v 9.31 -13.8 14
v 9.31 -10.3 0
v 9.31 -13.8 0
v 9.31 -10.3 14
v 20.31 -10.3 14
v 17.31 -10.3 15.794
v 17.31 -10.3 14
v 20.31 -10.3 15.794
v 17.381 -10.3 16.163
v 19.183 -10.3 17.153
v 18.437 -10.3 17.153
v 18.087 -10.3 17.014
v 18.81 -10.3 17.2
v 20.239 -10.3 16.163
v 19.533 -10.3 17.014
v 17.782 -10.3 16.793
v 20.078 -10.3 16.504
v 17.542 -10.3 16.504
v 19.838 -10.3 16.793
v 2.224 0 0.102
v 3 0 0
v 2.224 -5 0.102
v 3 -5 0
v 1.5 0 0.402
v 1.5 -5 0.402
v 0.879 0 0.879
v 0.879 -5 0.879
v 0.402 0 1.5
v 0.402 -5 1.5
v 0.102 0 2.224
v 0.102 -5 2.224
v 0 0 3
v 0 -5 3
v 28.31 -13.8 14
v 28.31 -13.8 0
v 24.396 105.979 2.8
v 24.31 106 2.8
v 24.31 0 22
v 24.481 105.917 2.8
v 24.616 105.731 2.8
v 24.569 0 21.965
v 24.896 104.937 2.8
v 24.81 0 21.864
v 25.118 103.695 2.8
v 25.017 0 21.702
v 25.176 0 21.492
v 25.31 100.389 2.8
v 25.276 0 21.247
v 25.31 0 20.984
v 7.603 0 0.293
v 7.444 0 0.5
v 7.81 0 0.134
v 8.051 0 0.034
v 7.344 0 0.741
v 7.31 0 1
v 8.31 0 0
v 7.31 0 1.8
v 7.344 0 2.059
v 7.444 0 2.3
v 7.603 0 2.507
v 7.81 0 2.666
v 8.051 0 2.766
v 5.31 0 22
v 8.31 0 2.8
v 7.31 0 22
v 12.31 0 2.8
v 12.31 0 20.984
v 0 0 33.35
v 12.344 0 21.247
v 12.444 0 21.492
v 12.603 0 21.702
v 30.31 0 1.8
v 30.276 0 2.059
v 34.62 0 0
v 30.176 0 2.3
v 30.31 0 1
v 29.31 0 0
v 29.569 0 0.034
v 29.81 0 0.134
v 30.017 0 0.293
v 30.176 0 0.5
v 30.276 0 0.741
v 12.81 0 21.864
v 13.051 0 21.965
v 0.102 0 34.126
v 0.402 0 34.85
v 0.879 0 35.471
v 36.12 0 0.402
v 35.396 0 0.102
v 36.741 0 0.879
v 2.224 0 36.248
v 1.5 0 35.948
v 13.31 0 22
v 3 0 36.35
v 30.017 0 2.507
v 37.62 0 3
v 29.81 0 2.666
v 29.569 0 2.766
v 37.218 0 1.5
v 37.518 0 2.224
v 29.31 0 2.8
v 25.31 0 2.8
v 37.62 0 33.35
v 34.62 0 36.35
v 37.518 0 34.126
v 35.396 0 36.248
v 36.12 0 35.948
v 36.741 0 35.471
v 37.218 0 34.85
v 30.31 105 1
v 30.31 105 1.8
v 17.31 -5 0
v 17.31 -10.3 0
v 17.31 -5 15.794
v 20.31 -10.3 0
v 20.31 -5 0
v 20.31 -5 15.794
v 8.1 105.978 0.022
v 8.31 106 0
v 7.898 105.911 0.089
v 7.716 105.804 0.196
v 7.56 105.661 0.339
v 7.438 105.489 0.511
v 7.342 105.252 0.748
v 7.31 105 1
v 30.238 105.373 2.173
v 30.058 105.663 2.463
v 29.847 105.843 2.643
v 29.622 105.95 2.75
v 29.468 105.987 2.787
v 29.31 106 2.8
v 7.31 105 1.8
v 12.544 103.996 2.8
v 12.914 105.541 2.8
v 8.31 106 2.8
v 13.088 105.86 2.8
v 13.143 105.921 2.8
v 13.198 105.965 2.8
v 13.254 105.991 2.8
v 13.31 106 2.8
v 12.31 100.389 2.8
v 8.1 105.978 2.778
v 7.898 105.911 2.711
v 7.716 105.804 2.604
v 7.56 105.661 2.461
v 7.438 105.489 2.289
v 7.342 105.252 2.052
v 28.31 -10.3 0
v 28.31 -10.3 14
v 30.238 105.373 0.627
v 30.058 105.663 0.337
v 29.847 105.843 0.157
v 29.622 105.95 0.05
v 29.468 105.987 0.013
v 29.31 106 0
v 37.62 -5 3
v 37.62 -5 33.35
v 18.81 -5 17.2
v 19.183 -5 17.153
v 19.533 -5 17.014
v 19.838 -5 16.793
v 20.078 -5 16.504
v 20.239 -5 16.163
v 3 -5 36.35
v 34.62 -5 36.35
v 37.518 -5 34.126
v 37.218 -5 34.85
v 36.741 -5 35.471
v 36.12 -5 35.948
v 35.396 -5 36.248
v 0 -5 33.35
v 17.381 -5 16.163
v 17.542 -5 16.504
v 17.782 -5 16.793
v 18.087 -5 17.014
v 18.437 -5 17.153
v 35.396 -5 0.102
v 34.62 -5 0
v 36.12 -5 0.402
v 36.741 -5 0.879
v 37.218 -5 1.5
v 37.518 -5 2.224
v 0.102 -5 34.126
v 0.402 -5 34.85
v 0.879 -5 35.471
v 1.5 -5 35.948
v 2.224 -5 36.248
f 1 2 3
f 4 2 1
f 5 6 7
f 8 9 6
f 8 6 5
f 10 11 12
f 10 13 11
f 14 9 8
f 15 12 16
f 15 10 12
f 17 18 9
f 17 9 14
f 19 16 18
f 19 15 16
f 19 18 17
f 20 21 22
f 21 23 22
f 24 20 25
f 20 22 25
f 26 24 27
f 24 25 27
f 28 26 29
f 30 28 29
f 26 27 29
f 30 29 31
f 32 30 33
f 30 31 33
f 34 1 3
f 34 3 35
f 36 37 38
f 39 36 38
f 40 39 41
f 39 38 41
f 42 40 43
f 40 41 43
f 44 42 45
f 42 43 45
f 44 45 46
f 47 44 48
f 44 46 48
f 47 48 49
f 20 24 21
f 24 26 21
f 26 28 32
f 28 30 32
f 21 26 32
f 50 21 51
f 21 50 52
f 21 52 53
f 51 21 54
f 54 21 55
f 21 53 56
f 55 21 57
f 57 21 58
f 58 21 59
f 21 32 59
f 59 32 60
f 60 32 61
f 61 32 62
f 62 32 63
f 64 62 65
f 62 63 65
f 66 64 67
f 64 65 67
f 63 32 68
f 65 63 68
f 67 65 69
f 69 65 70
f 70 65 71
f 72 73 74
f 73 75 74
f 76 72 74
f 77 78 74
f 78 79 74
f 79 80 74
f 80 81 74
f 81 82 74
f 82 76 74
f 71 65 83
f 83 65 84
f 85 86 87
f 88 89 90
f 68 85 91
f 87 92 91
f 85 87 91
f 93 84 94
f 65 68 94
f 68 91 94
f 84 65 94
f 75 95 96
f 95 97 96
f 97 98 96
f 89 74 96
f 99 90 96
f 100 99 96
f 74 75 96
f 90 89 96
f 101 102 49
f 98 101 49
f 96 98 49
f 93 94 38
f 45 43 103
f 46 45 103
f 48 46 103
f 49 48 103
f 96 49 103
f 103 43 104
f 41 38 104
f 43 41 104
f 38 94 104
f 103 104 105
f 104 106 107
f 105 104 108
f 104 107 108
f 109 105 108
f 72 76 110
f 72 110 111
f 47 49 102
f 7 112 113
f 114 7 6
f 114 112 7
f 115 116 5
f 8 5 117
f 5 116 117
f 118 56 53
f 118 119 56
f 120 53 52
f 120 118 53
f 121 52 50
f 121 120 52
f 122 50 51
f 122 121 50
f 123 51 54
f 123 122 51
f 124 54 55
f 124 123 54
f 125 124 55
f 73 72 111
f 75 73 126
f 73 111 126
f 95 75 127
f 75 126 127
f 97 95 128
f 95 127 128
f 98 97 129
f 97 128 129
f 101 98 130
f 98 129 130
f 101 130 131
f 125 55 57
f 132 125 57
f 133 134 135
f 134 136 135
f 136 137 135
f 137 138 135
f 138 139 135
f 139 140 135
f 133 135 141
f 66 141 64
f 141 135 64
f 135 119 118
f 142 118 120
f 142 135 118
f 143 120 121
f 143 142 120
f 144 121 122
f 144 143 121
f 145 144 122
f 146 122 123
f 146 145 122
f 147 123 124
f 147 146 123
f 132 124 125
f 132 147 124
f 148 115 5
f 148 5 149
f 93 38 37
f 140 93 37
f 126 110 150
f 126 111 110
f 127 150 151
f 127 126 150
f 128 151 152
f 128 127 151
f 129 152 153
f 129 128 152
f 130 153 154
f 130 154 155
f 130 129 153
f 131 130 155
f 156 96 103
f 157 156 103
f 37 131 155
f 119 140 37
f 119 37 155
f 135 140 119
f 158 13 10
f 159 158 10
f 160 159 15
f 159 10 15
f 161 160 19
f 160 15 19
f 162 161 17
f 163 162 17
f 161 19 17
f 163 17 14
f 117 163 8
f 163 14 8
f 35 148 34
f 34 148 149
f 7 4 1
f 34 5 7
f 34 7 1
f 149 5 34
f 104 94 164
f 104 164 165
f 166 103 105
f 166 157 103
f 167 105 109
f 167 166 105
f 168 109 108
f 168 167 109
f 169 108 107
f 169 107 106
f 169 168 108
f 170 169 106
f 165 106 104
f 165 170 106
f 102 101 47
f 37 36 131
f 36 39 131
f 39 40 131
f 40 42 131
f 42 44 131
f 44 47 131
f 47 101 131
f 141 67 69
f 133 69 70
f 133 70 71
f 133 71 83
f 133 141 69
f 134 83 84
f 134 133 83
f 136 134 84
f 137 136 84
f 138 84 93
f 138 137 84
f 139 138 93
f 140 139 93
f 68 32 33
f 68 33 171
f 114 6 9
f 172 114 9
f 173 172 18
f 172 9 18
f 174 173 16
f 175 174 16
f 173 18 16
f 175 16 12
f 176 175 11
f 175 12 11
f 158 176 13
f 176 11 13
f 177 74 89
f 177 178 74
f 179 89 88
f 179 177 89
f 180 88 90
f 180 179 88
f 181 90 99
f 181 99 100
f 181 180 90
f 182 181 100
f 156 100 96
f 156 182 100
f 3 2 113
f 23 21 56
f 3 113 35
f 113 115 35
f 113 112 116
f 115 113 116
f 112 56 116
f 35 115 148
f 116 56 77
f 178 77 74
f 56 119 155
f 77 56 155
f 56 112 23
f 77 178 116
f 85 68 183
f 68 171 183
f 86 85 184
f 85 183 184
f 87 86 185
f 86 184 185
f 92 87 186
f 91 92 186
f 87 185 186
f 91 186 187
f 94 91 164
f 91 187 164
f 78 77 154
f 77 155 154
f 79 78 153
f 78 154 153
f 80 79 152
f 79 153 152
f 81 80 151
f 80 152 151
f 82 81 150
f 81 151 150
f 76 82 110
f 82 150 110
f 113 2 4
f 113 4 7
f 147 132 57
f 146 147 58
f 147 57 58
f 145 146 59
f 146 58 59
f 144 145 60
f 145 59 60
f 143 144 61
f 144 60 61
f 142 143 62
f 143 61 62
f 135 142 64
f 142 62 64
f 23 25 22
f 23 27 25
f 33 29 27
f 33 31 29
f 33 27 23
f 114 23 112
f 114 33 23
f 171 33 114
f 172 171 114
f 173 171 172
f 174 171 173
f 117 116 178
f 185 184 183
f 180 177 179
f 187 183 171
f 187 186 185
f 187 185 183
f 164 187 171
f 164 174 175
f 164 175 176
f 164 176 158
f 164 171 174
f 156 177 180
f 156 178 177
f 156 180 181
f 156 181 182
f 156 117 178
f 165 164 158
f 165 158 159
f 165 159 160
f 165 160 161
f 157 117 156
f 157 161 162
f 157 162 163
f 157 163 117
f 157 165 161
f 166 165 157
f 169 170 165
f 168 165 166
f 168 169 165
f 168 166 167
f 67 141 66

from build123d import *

# Parameters (mm, degrees)
F0_W      = 37.62
F0_H      = 36.35
F1_DEPTH  = 5
F2_W      = 3
F2_H      = 17.2
F3_DEPTH  = 5.3
F4_W      = 19
F4_H      = 14
F5_DEPTH  = 3.5
F6_W      = 23
F6_H      = 22
F7_DEPTH  = 106
F9_DEPTH  = 25
F11_DEPTH = 5
F13_DEPTH = 5
F14_R     = 3
F16_DEPTH = 5.3
F17_R     = 1


with BuildPart() as f1:
    # F0 (on Front) → F1 (new body)
    with BuildSketch(Plane.XZ):
        with Locations((18.81, 18.175)):
            Rectangle(F0_W, F0_H)
    extrude(amount=F1_DEPTH)

    # F2 (on face) → F3 (join)
    with BuildSketch(Plane.XZ.offset(5)):
        with Locations((18.81, 8.6)):
            Rectangle(F2_W, F2_H)
    extrude(amount=F3_DEPTH)

    # F4 (on face) → F5 (join)
    with BuildSketch(Plane.XZ.offset(10.3)):
        with Locations((18.81, 7)):
            Rectangle(F4_W, F4_H)
    extrude(amount=F5_DEPTH)

    # F6 (on face) → F7 (join)
    with BuildSketch(Plane(origin=(0, 0, 0), x_dir=(-1, 0, 0), z_dir=(0, 1, 0))):
        with Locations((-18.81, 11)):
            Rectangle(F6_W, F6_H)
    extrude(amount=F7_DEPTH)

    # F8 (on face) → F9 (cut)
    with BuildSketch(Plane.YZ.offset(30.31)):
        Polygon((106, 22), (0, 22), (106, 2.8), align=None)
    extrude(amount=-F9_DEPTH, mode=Mode.SUBTRACT)

    # F10 (on face) → F11 (cut)
    with BuildSketch(Plane.YZ.offset(30.31)):
        Polygon((0, 2.8), (106, 2.8), (0, 22), align=None)
    extrude(amount=-F11_DEPTH, mode=Mode.SUBTRACT)

    # F12 (on face) → F13 (cut)
    with BuildSketch(Plane(origin=(7.31, 0, 0), x_dir=(0, -1, 0), z_dir=(-1, 0, 0))):
        Polygon((0, 22), (-106, 2.8), (0, 2.8), align=None)
    extrude(amount=-F13_DEPTH, mode=Mode.SUBTRACT)

    # F14
    f14_edges = [f1.edges().sort_by_distance(p)[0] for p in [
        (37.62, -2.5, 0),
        (37.62, -2.5, 36.35),
        (0, -2.5, 36.35),
        (0, -2.5, 0),
    ]]
    fillet(f14_edges, radius=F14_R)

    # F15 (on face) → F16 (cut, through all)
    with BuildSketch(Plane.XZ.offset(10.3)):
        with BuildLine():
            ThreePointArc((17.31, 15.79375), (17.7819509907, 16.79346061), (18.81, 17.2))
            Line((18.81, 17.2), (17.31, 17.2))
            Line((17.31, 17.2), (17.31, 15.79375))
        make_face()
        with BuildLine():
            ThreePointArc((18.81, 17.2), (19.8380490093, 16.79346061), (20.31, 15.79375))
            Line((20.31, 15.79375), (20.31, 17.2))
            Line((20.31, 17.2), (18.81, 17.2))
        make_face()
    extrude(amount=-F16_DEPTH, mode=Mode.SUBTRACT)

    # F17
    f17_edges = [f1.edges().sort_by_distance(p)[0] for p in [
        (30.31, 106, 1.4),
        (7.31, 106, 1.4),
        (7.31, 53, 2.8),
        (7.31, 53, 0),
        (25.31, 53, 12.4),
        (30.31, 53, 2.8),
        (30.31, 53, 0),
        (12.31, 53, 12.4),
    ]]
    fillet(f17_edges, radius=F17_R)


solid = f1.part
